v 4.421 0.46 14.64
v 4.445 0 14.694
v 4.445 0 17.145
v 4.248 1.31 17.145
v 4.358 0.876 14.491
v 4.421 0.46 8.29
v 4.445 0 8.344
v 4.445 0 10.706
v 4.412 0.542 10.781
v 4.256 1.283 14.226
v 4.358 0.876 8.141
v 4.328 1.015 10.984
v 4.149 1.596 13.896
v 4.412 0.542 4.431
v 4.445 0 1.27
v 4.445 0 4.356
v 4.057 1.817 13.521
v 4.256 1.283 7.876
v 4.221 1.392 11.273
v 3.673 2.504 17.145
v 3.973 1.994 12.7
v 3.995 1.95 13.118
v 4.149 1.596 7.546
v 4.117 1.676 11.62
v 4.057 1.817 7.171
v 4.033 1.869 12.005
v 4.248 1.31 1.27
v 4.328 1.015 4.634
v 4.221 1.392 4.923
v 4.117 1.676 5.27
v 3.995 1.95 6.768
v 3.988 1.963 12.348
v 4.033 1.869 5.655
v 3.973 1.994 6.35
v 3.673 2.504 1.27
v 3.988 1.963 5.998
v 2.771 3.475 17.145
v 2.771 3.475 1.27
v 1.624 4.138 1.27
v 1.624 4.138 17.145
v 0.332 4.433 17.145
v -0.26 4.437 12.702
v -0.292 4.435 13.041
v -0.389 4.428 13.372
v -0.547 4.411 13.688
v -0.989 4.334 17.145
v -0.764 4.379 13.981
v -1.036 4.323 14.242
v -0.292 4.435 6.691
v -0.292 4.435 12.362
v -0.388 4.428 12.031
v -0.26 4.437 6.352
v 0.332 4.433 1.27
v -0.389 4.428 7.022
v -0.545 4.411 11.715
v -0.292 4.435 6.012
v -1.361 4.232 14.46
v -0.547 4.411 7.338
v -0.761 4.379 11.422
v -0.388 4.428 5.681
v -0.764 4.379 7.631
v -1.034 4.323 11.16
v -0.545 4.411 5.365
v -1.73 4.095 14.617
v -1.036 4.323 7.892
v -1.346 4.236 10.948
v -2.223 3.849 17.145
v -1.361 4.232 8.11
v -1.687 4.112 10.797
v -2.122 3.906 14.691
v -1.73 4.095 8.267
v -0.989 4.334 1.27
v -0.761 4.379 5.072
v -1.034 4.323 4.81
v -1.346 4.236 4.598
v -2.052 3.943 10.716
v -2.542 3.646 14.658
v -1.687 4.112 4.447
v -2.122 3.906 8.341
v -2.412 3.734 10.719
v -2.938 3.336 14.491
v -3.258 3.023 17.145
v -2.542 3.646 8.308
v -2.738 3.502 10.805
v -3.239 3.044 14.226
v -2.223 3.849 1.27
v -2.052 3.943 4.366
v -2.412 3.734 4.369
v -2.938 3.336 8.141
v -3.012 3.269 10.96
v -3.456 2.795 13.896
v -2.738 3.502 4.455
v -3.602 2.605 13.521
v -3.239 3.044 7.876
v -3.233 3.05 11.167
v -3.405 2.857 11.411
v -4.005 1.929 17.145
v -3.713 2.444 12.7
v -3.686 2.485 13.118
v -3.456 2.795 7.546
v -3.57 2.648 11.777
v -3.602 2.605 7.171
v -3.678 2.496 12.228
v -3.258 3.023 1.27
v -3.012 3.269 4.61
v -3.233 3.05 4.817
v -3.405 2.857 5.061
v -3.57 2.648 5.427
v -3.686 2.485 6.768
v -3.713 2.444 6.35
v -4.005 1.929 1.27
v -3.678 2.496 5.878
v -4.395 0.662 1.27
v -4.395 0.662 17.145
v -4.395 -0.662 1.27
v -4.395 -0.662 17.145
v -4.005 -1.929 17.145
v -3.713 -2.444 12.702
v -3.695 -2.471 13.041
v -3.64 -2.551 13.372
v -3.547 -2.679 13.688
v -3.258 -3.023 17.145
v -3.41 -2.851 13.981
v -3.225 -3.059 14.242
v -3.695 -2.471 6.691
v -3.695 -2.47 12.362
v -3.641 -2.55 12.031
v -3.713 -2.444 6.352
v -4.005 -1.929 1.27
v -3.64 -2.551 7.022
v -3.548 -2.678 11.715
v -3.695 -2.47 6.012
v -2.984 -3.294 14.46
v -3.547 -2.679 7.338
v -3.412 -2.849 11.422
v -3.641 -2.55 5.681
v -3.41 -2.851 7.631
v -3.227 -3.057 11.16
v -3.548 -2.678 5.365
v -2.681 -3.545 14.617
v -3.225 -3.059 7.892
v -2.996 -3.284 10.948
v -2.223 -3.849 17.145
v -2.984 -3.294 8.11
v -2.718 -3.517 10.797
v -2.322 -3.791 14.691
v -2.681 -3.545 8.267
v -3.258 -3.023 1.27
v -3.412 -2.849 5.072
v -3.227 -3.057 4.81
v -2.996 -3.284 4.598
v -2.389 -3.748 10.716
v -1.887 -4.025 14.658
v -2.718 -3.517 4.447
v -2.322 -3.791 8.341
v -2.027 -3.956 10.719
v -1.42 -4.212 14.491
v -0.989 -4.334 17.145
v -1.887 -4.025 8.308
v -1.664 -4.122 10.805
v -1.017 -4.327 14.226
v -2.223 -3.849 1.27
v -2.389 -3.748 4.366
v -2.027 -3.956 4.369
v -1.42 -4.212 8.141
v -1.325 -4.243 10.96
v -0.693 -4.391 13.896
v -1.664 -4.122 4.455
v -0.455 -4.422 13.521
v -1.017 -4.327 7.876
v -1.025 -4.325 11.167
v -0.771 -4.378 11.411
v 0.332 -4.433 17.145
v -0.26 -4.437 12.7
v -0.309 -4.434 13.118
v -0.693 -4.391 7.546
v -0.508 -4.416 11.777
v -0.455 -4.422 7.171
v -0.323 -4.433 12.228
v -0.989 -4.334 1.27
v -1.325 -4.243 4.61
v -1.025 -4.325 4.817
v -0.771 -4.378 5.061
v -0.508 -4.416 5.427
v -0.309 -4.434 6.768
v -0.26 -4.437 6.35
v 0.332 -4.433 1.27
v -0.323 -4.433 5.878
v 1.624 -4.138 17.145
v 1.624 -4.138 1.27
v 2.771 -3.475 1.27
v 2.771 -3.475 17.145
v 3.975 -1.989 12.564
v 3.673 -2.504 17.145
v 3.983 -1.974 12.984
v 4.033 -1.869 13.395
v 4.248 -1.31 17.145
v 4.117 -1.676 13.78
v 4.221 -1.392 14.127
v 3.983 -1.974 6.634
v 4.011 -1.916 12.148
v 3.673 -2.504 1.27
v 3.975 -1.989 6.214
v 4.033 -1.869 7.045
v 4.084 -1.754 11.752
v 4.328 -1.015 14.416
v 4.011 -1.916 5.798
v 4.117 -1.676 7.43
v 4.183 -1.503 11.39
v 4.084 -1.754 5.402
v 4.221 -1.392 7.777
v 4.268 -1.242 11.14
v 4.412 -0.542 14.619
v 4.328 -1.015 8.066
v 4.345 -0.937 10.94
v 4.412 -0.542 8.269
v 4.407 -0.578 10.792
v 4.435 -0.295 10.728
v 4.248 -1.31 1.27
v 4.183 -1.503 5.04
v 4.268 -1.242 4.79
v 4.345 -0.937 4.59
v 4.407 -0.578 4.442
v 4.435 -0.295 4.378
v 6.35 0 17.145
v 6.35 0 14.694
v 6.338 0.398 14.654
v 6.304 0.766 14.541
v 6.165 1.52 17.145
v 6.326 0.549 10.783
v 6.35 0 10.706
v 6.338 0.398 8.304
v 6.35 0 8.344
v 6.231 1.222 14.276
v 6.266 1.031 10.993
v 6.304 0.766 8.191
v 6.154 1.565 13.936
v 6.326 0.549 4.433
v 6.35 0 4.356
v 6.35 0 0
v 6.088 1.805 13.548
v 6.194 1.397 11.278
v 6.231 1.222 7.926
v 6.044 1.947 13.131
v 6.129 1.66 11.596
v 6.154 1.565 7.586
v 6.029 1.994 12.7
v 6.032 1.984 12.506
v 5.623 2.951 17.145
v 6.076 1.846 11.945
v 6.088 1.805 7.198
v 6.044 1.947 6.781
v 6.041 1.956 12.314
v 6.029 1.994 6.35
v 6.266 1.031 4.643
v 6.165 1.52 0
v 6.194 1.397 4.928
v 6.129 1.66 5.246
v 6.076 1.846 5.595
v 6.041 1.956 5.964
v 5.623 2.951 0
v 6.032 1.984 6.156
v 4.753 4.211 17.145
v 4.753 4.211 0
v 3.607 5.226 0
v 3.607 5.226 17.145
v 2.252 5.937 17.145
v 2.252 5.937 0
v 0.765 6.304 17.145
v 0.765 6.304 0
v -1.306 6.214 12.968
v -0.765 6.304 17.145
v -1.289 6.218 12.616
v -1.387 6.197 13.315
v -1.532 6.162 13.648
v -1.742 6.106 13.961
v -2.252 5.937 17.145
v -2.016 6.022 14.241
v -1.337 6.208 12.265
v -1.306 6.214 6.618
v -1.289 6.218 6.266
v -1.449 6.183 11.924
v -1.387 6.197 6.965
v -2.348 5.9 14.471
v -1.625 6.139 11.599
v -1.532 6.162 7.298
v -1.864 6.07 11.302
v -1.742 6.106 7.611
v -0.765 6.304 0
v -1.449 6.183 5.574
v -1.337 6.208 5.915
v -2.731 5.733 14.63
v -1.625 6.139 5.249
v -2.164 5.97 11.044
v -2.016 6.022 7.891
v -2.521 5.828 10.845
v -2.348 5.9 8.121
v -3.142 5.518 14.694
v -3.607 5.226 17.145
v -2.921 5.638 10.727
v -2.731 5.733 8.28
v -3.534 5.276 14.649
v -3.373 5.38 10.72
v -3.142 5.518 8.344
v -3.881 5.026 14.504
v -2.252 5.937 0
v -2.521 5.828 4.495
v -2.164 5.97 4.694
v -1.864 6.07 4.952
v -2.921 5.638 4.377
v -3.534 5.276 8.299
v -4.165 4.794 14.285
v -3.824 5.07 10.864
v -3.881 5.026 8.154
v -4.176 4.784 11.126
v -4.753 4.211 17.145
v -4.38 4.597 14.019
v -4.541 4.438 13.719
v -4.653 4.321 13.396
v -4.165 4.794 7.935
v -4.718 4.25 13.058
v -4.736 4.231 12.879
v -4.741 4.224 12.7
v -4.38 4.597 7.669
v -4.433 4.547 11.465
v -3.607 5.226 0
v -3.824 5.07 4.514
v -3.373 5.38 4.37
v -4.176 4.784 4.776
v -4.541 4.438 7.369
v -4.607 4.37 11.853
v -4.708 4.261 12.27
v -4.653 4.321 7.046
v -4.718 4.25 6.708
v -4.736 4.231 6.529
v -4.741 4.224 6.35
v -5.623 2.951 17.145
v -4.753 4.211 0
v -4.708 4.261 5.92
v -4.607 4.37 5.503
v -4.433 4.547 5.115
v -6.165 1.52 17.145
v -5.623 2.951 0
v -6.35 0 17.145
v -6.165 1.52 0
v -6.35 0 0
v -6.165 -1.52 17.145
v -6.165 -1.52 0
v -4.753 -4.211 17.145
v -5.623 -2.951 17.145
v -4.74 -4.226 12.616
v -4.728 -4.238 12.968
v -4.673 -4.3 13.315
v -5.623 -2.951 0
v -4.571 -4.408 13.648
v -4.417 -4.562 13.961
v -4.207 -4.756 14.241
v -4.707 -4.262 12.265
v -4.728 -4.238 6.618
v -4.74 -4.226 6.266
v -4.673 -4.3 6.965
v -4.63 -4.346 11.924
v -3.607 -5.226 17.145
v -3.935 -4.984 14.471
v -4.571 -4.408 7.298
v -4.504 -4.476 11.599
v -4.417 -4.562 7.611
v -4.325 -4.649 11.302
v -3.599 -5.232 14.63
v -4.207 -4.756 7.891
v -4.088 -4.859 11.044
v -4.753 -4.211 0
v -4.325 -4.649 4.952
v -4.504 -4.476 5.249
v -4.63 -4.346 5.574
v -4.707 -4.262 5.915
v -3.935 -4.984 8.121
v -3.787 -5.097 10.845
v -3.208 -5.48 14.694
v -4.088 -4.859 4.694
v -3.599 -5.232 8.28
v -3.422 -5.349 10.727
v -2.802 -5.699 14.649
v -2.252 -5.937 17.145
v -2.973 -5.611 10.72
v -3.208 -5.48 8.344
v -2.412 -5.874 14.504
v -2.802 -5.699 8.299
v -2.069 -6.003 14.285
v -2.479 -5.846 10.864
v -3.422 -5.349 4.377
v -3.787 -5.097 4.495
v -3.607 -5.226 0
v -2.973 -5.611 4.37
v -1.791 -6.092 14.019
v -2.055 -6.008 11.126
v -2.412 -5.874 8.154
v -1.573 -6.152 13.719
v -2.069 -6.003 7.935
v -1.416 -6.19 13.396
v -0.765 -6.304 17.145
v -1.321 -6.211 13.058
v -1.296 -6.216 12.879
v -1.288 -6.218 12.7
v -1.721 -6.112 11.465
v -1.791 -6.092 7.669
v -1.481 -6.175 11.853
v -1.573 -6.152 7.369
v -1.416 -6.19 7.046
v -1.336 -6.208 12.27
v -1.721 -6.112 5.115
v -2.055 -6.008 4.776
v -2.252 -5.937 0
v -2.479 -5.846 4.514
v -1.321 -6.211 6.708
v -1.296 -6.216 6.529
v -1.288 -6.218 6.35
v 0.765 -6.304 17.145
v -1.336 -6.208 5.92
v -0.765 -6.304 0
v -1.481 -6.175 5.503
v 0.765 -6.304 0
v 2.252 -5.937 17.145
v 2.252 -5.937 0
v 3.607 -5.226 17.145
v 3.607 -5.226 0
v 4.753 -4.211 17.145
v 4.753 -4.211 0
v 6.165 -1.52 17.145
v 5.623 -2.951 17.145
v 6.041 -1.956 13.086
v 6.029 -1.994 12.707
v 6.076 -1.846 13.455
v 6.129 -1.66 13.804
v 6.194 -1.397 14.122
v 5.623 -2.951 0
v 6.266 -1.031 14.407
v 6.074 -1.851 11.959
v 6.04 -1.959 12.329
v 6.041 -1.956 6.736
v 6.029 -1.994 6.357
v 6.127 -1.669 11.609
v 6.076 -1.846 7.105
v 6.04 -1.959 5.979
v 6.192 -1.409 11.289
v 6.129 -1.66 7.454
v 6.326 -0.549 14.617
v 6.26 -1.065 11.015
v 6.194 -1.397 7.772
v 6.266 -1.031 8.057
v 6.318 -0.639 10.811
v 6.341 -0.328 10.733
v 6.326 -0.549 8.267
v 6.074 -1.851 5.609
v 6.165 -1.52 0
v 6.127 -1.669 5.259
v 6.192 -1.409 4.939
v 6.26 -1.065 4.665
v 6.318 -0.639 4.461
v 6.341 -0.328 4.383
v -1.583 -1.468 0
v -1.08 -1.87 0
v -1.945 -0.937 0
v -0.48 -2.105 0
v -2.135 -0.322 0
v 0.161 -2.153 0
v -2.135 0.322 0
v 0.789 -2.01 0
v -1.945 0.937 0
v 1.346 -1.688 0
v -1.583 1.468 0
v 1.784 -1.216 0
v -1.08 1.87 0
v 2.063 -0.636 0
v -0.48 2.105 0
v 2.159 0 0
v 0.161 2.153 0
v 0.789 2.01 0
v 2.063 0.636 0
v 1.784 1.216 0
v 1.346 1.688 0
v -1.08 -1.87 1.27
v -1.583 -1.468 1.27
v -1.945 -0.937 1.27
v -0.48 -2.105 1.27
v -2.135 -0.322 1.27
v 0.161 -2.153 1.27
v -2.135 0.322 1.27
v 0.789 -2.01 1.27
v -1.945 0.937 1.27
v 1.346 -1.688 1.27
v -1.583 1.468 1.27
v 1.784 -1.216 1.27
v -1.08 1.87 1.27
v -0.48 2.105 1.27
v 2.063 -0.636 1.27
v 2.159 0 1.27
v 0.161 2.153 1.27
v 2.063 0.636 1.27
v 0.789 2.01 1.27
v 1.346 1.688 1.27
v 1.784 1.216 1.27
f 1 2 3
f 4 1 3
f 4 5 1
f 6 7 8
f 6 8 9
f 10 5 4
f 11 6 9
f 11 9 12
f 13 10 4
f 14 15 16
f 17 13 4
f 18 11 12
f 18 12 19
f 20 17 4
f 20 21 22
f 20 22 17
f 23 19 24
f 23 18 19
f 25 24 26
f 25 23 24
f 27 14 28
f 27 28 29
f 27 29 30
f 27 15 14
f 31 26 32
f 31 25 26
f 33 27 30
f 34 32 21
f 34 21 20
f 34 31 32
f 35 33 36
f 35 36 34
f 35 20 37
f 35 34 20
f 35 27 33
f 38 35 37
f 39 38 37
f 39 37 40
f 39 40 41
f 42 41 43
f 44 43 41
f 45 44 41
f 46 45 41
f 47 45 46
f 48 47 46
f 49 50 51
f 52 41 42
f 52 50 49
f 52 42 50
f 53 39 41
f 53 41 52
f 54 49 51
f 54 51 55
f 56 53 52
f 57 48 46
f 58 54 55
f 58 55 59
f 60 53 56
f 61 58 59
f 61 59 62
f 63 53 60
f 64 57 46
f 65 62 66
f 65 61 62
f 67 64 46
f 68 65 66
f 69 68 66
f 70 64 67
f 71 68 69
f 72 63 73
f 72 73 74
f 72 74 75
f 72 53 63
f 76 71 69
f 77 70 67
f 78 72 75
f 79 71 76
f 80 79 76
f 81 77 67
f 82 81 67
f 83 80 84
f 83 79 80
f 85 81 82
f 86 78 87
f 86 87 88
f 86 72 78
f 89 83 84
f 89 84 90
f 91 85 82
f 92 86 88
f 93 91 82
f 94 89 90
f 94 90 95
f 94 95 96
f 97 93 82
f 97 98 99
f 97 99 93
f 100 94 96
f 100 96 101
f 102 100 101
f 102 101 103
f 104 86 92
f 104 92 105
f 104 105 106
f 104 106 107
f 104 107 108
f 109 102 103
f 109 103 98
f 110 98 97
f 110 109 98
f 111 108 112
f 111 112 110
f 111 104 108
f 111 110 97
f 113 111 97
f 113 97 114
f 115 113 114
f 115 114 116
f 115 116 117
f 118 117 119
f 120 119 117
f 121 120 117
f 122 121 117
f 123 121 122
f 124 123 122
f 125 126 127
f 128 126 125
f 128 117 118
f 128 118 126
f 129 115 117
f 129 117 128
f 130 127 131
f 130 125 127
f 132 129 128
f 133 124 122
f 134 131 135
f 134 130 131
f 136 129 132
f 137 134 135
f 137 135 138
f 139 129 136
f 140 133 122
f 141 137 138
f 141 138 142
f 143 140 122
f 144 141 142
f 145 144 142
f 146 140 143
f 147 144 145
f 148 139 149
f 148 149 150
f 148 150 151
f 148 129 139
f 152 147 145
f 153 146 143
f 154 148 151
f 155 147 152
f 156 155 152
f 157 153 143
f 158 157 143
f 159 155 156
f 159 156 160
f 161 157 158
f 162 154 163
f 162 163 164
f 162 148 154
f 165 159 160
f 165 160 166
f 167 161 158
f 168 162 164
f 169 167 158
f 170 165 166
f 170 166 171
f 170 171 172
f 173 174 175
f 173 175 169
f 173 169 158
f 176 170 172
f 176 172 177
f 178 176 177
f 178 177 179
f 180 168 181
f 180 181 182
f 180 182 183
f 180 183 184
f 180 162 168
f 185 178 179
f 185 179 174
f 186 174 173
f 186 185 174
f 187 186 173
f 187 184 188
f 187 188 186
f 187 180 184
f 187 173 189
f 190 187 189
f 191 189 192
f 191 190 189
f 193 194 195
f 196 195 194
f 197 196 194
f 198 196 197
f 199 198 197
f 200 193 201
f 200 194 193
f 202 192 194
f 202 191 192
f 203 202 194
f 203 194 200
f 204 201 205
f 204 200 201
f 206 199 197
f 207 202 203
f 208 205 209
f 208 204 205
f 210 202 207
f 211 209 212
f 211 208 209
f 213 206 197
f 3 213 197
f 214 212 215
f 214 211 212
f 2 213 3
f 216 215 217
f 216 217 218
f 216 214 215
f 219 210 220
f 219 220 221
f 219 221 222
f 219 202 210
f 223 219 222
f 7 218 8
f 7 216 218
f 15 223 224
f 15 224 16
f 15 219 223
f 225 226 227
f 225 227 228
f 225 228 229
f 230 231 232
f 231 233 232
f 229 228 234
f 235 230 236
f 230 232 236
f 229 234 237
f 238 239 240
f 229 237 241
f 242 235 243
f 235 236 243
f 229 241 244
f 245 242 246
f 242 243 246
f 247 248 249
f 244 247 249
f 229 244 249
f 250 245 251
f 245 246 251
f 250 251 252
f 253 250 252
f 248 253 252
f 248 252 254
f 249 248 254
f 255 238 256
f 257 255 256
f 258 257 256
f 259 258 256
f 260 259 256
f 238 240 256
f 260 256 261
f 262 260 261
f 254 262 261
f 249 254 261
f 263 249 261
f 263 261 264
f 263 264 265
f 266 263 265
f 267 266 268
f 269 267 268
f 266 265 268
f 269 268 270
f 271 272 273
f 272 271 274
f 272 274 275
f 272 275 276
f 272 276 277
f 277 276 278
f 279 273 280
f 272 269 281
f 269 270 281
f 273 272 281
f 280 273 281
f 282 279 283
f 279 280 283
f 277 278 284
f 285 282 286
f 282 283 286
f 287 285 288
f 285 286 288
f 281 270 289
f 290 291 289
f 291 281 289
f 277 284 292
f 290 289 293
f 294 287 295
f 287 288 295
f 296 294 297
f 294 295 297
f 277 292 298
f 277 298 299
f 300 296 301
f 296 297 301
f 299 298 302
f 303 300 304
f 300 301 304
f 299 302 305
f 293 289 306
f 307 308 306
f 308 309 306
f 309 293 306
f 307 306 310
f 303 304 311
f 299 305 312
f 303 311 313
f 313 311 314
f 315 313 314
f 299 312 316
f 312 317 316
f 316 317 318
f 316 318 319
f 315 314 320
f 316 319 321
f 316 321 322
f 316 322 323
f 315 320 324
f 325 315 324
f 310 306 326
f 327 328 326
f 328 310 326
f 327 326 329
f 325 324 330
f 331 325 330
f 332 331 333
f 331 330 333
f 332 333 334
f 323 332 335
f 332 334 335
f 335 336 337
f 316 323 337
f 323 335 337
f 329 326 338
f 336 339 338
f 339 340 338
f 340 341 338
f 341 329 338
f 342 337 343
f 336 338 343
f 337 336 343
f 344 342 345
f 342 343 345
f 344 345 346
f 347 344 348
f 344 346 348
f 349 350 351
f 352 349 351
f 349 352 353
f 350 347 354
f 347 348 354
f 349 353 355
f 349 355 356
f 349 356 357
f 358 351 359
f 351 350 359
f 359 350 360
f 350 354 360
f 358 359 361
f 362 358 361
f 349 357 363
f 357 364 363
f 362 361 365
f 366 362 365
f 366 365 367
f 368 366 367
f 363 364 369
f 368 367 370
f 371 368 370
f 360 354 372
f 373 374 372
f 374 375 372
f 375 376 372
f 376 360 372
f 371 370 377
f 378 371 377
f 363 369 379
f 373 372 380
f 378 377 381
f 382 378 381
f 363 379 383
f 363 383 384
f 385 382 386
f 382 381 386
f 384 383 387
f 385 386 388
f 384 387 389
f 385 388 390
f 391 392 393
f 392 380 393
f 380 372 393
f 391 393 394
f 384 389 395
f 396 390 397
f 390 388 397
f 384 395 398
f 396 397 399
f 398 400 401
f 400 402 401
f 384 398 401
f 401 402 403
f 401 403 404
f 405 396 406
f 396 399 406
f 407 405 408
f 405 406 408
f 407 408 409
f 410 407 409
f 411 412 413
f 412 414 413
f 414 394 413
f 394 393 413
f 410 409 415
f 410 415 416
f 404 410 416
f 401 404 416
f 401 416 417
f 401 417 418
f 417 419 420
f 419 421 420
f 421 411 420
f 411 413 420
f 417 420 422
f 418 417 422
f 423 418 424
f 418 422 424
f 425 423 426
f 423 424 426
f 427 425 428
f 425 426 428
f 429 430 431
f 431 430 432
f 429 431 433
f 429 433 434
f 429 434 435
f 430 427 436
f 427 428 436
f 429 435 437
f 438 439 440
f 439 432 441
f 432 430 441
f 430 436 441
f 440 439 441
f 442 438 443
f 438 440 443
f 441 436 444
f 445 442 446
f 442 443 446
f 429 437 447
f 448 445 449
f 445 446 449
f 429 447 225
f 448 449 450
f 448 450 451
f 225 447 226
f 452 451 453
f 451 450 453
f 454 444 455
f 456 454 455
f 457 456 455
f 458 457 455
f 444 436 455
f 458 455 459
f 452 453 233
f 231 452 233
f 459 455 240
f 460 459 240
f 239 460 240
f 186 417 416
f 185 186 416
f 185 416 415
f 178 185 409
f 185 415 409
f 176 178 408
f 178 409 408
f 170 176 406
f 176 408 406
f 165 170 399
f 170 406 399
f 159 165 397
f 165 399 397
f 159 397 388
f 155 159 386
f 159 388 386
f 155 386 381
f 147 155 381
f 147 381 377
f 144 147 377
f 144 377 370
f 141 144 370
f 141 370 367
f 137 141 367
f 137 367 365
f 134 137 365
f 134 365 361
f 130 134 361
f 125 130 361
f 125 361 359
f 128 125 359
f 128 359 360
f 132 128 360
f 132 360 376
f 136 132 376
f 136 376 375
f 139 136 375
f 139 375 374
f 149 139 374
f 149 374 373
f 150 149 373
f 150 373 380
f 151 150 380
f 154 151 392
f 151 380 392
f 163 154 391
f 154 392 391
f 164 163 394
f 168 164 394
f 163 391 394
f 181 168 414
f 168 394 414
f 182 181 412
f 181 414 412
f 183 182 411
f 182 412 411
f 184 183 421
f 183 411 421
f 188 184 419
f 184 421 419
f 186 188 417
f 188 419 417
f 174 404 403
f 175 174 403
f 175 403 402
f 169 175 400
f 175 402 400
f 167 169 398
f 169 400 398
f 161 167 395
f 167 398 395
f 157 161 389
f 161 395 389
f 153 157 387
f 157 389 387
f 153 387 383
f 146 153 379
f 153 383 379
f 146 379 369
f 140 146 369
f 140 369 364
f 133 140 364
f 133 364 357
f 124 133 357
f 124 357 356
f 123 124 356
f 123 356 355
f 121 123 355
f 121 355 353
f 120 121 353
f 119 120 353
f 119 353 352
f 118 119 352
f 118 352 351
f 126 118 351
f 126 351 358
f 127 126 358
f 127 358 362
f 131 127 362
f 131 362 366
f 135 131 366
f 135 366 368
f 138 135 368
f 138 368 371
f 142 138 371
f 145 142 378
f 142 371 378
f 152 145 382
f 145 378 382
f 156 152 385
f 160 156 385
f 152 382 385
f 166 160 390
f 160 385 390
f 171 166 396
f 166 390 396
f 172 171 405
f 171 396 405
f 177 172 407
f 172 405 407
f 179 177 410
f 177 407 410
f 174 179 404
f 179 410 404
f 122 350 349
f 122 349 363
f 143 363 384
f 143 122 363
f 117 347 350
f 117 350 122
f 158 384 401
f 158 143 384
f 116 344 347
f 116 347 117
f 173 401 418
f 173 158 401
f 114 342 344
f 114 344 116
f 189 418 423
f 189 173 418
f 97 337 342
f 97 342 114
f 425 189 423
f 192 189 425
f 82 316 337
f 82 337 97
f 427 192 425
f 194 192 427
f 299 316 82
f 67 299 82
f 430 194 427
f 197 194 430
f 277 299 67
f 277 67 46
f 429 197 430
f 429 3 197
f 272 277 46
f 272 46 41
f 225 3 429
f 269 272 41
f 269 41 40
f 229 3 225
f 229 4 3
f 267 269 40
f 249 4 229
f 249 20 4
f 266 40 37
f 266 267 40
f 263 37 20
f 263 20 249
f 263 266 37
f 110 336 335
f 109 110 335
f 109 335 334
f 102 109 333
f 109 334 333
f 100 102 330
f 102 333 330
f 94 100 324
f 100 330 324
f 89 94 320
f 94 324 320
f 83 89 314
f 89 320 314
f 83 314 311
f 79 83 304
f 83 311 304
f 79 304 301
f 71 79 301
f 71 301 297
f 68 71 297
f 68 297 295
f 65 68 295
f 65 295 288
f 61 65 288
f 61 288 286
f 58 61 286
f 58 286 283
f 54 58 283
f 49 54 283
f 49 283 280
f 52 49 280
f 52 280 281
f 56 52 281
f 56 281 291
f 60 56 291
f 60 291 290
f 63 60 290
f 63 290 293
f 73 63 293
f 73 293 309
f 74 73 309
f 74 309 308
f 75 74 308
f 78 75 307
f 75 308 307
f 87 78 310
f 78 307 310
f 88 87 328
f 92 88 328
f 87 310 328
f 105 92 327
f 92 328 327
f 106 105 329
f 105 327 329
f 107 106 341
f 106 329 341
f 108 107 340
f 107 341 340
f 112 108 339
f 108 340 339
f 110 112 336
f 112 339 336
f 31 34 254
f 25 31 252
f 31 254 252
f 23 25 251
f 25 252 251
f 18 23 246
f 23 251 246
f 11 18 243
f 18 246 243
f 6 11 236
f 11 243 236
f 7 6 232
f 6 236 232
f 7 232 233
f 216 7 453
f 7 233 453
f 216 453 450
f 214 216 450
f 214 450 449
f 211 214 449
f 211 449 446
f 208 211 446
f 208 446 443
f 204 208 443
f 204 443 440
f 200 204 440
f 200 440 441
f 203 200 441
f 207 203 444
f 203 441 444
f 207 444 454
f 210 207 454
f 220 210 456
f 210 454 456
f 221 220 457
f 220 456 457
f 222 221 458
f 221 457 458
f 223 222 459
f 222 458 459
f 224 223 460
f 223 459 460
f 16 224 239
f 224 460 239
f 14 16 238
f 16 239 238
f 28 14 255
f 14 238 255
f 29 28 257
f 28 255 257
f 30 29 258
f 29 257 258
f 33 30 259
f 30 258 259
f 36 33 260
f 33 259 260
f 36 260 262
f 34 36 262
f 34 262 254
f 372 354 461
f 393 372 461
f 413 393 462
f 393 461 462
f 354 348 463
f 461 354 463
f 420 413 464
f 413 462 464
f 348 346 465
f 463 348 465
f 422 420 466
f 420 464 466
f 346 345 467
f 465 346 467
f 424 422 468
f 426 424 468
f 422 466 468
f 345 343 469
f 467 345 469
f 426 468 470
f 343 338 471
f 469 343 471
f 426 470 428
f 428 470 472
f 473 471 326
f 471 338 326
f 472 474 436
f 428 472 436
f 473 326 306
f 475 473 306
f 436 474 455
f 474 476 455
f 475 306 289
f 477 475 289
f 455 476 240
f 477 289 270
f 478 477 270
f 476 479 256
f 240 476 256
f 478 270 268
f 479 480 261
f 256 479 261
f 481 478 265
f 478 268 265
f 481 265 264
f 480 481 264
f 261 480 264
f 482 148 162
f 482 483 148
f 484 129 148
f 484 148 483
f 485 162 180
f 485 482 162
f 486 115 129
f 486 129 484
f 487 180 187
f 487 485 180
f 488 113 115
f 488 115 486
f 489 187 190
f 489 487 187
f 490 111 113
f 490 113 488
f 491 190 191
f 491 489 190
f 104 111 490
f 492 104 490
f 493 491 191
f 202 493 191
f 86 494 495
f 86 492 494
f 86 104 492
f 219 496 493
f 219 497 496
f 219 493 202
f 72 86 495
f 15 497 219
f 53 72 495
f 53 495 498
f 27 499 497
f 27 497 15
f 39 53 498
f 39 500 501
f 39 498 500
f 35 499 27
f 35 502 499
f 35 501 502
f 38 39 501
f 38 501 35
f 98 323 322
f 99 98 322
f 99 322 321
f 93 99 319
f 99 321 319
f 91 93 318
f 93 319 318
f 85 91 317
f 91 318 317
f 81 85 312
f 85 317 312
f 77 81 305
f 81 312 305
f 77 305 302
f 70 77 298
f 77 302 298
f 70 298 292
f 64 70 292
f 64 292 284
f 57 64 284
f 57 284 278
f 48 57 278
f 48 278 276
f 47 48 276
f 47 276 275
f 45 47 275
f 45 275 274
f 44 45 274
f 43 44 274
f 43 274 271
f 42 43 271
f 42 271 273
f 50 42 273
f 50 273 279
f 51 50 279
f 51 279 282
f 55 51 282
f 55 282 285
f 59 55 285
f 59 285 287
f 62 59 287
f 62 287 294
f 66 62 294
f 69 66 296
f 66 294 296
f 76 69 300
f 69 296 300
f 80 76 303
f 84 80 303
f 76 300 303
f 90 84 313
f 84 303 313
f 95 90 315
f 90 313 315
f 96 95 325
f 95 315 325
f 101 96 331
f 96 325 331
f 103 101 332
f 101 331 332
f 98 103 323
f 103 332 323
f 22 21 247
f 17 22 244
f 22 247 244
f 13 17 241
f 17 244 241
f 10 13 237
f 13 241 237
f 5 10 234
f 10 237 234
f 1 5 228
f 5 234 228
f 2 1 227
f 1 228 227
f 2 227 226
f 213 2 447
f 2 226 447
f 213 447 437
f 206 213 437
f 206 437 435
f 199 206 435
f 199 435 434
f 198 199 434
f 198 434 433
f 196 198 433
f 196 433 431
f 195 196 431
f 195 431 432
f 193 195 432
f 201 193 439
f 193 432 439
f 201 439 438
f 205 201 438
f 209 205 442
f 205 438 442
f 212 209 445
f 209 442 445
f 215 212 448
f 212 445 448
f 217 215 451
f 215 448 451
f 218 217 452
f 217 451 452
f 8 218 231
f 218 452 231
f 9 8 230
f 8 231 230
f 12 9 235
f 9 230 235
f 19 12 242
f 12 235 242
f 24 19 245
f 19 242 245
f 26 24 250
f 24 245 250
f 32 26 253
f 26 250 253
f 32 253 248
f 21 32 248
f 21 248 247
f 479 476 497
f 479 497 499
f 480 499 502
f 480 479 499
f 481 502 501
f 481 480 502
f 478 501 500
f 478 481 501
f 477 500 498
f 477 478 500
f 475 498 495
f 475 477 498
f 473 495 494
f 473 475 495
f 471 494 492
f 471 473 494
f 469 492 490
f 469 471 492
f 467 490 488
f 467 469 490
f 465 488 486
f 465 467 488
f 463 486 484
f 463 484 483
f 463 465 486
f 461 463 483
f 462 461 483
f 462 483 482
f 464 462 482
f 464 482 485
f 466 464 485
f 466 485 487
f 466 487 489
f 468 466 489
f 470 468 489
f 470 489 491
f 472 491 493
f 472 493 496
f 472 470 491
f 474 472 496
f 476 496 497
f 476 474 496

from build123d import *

# Parameters (mm, degrees)
F0_R       = 6.35
F0_R_2     = 2.159
F1_DEPTH   = 1.27
F2_R       = 6.35
F2_R_2     = 4.445
F3_DEPTH   = 15.875
F5_R       = 1.9939
F6_DEPTH   = 6.35
F7_COUNT   = 3
F8_R       = 1.9939
F6_FACE_R  = 1.9939
F9_DEPTH   = 6.35
F7_FACE_R  = 1.9939
F10_R      = 1.9939
F11_DEPTH  = 6.35
F7_FACE1_R = 1.9939
F12_R      = 1.9939
F13_DEPTH  = 6.35


with BuildPart() as f1:
    # F0 (on Top) → F1 (new body)
    with BuildSketch(Plane.XY):
        Circle(F0_R)
        Circle(F0_R_2, mode=Mode.SUBTRACT)
    extrude(amount=F1_DEPTH)

    # F2 (on face) → F3 (join)
    with BuildSketch(Plane.XY.offset(1.27)):
        Circle(F2_R)
        Circle(F2_R_2, mode=Mode.SUBTRACT)
    extrude(amount=F3_DEPTH)


with BuildPart() as f6:
    # F5 (on offset) → F6 (new body)
    with BuildSketch(Plane.YZ.offset(6.35)):
        with Locations((0, 6.35)):
            Circle(F5_R)
    extrude(amount=-F6_DEPTH)


with BuildPart() as f6b:
    # F5 (on offset) → F6, piece 2 (new body)
    with BuildSketch(Plane.YZ.offset(6.35)):
        with Locations((0, 12.7)):
            Circle(F5_R)
    extrude(amount=-F6_DEPTH)


with BuildPart() as f7_1:
    # F7: instance of F6
    add(f6.part.rotate(Axis((0, 0, 17.145), (0, 0, 1)), 1 * 360 / F7_COUNT))


with BuildPart() as f7_2:
    # F7: instance of F6
    add(f6.part.rotate(Axis((0, 0, 17.145), (0, 0, 1)), 2 * 360 / F7_COUNT))


with BuildPart() as f7_3:
    # F7: instance of F6b
    add(f6b.part.rotate(Axis((0, 0, 17.145), (0, 0, 1)), 1 * 360 / F7_COUNT))


with BuildPart() as f7_4:
    # F7: instance of F6b
    add(f6b.part.rotate(Axis((0, 0, 17.145), (0, 0, 1)), 2 * 360 / F7_COUNT))


with BuildPart() as f9_tool:
    # F8 (on face) + F6_face (on face) → F9 (new body)
    with BuildSketch(Plane.YZ.offset(6.35)):
        with Locations((0, 6.35)):
            Circle(F8_R)
    with BuildSketch(Plane(origin=(6.35, 0, 6.35), x_dir=(0, 1, 0), z_dir=(1, 0, 0))):
        with Locations((0, 6.35)):
            Circle(F6_FACE_R)
    extrude(amount=-F9_DEPTH)


with BuildPart() as f1_1:
    add(f1.part)

    # F9: cut by f9_tool
    add(f9_tool.part, mode=Mode.SUBTRACT)


with BuildPart() as f6_1:
    add(f6.part)

    # F9: cut by f9_tool
    add(f9_tool.part, mode=Mode.SUBTRACT)


with BuildPart() as f6b_1:
    add(f6b.part)

    # F9: cut by f9_tool
    add(f9_tool.part, mode=Mode.SUBTRACT)


with BuildPart() as f7_1_1:
    add(f7_1.part)

    # F9: cut by f9_tool
    add(f9_tool.part, mode=Mode.SUBTRACT)


with BuildPart() as f7_2_1:
    add(f7_2.part)

    # F9: cut by f9_tool
    add(f9_tool.part, mode=Mode.SUBTRACT)


with BuildPart() as f7_3_1:
    add(f7_3.part)

    # F9: cut by f9_tool
    add(f9_tool.part, mode=Mode.SUBTRACT)


with BuildPart() as f7_4_1:
    add(f7_4.part)

    # F9: cut by f9_tool
    add(f9_tool.part, mode=Mode.SUBTRACT)


with BuildPart() as f11_tool:
    # F7_face (on face) + F10 (on face) → F11 (new body)
    with BuildSketch(Plane(origin=(-3.175, 5.499261314, 6.35), x_dir=(-0.8660254038, -0.5, 0), z_dir=(-0.5, 0.8660254038, 0))):
        with Locations((0, 6.35)):
            Circle(F7_FACE_R)
    with BuildSketch(Plane(origin=(-3.175, 5.499261314, 0), x_dir=(-0.8660254038, -0.5, 0), z_dir=(-0.5, 0.8660254038, 0))):
        with Locations((0, 6.35)):
            Circle(F10_R)
    extrude(amount=-F11_DEPTH)


with BuildPart() as f1_2:
    add(f1_1.part)

    # F11: cut by f11_tool
    add(f11_tool.part, mode=Mode.SUBTRACT)


with BuildPart() as f7_1_2:
    add(f7_1_1.part)

    # F11: cut by f11_tool
    add(f11_tool.part, mode=Mode.SUBTRACT)


with BuildPart() as f7_2_2:
    add(f7_2_1.part)

    # F11: cut by f11_tool
    add(f11_tool.part, mode=Mode.SUBTRACT)


with BuildPart() as f7_3_2:
    add(f7_3_1.part)

    # F11: cut by f11_tool
    add(f11_tool.part, mode=Mode.SUBTRACT)


with BuildPart() as f7_4_2:
    add(f7_4_1.part)

    # F11: cut by f11_tool
    add(f11_tool.part, mode=Mode.SUBTRACT)


with BuildPart() as f13_tool:
    # F7_face1 (on face) + F12 (on face) → F13 (new body)
    with BuildSketch(Plane(origin=(-3.175, -5.499261314, 6.35), x_dir=(0.8660254038, -0.5, 0), z_dir=(-0.5, -0.8660254038, 0))):
        with Locations((0, 6.35)):
            Circle(F7_FACE1_R)
    with BuildSketch(Plane(origin=(-3.175, -5.499261314, 0), x_dir=(0.8660254038, -0.5, 0), z_dir=(-0.5, -0.8660254038, 0))):
        with Locations((0, 6.35)):
            Circle(F12_R)
    extrude(amount=-F13_DEPTH)


with BuildPart() as f1_3:
    add(f1_2.part)

    # F13: cut by f13_tool
    add(f13_tool.part, mode=Mode.SUBTRACT)


with BuildPart() as f7_2_3:
    add(f7_2_2.part)

    # F13: cut by f13_tool
    add(f13_tool.part, mode=Mode.SUBTRACT)


with BuildPart() as f7_4_3:
    add(f7_4_2.part)

    # F13: cut by f13_tool
    add(f13_tool.part, mode=Mode.SUBTRACT)


solid = f1_3.part
